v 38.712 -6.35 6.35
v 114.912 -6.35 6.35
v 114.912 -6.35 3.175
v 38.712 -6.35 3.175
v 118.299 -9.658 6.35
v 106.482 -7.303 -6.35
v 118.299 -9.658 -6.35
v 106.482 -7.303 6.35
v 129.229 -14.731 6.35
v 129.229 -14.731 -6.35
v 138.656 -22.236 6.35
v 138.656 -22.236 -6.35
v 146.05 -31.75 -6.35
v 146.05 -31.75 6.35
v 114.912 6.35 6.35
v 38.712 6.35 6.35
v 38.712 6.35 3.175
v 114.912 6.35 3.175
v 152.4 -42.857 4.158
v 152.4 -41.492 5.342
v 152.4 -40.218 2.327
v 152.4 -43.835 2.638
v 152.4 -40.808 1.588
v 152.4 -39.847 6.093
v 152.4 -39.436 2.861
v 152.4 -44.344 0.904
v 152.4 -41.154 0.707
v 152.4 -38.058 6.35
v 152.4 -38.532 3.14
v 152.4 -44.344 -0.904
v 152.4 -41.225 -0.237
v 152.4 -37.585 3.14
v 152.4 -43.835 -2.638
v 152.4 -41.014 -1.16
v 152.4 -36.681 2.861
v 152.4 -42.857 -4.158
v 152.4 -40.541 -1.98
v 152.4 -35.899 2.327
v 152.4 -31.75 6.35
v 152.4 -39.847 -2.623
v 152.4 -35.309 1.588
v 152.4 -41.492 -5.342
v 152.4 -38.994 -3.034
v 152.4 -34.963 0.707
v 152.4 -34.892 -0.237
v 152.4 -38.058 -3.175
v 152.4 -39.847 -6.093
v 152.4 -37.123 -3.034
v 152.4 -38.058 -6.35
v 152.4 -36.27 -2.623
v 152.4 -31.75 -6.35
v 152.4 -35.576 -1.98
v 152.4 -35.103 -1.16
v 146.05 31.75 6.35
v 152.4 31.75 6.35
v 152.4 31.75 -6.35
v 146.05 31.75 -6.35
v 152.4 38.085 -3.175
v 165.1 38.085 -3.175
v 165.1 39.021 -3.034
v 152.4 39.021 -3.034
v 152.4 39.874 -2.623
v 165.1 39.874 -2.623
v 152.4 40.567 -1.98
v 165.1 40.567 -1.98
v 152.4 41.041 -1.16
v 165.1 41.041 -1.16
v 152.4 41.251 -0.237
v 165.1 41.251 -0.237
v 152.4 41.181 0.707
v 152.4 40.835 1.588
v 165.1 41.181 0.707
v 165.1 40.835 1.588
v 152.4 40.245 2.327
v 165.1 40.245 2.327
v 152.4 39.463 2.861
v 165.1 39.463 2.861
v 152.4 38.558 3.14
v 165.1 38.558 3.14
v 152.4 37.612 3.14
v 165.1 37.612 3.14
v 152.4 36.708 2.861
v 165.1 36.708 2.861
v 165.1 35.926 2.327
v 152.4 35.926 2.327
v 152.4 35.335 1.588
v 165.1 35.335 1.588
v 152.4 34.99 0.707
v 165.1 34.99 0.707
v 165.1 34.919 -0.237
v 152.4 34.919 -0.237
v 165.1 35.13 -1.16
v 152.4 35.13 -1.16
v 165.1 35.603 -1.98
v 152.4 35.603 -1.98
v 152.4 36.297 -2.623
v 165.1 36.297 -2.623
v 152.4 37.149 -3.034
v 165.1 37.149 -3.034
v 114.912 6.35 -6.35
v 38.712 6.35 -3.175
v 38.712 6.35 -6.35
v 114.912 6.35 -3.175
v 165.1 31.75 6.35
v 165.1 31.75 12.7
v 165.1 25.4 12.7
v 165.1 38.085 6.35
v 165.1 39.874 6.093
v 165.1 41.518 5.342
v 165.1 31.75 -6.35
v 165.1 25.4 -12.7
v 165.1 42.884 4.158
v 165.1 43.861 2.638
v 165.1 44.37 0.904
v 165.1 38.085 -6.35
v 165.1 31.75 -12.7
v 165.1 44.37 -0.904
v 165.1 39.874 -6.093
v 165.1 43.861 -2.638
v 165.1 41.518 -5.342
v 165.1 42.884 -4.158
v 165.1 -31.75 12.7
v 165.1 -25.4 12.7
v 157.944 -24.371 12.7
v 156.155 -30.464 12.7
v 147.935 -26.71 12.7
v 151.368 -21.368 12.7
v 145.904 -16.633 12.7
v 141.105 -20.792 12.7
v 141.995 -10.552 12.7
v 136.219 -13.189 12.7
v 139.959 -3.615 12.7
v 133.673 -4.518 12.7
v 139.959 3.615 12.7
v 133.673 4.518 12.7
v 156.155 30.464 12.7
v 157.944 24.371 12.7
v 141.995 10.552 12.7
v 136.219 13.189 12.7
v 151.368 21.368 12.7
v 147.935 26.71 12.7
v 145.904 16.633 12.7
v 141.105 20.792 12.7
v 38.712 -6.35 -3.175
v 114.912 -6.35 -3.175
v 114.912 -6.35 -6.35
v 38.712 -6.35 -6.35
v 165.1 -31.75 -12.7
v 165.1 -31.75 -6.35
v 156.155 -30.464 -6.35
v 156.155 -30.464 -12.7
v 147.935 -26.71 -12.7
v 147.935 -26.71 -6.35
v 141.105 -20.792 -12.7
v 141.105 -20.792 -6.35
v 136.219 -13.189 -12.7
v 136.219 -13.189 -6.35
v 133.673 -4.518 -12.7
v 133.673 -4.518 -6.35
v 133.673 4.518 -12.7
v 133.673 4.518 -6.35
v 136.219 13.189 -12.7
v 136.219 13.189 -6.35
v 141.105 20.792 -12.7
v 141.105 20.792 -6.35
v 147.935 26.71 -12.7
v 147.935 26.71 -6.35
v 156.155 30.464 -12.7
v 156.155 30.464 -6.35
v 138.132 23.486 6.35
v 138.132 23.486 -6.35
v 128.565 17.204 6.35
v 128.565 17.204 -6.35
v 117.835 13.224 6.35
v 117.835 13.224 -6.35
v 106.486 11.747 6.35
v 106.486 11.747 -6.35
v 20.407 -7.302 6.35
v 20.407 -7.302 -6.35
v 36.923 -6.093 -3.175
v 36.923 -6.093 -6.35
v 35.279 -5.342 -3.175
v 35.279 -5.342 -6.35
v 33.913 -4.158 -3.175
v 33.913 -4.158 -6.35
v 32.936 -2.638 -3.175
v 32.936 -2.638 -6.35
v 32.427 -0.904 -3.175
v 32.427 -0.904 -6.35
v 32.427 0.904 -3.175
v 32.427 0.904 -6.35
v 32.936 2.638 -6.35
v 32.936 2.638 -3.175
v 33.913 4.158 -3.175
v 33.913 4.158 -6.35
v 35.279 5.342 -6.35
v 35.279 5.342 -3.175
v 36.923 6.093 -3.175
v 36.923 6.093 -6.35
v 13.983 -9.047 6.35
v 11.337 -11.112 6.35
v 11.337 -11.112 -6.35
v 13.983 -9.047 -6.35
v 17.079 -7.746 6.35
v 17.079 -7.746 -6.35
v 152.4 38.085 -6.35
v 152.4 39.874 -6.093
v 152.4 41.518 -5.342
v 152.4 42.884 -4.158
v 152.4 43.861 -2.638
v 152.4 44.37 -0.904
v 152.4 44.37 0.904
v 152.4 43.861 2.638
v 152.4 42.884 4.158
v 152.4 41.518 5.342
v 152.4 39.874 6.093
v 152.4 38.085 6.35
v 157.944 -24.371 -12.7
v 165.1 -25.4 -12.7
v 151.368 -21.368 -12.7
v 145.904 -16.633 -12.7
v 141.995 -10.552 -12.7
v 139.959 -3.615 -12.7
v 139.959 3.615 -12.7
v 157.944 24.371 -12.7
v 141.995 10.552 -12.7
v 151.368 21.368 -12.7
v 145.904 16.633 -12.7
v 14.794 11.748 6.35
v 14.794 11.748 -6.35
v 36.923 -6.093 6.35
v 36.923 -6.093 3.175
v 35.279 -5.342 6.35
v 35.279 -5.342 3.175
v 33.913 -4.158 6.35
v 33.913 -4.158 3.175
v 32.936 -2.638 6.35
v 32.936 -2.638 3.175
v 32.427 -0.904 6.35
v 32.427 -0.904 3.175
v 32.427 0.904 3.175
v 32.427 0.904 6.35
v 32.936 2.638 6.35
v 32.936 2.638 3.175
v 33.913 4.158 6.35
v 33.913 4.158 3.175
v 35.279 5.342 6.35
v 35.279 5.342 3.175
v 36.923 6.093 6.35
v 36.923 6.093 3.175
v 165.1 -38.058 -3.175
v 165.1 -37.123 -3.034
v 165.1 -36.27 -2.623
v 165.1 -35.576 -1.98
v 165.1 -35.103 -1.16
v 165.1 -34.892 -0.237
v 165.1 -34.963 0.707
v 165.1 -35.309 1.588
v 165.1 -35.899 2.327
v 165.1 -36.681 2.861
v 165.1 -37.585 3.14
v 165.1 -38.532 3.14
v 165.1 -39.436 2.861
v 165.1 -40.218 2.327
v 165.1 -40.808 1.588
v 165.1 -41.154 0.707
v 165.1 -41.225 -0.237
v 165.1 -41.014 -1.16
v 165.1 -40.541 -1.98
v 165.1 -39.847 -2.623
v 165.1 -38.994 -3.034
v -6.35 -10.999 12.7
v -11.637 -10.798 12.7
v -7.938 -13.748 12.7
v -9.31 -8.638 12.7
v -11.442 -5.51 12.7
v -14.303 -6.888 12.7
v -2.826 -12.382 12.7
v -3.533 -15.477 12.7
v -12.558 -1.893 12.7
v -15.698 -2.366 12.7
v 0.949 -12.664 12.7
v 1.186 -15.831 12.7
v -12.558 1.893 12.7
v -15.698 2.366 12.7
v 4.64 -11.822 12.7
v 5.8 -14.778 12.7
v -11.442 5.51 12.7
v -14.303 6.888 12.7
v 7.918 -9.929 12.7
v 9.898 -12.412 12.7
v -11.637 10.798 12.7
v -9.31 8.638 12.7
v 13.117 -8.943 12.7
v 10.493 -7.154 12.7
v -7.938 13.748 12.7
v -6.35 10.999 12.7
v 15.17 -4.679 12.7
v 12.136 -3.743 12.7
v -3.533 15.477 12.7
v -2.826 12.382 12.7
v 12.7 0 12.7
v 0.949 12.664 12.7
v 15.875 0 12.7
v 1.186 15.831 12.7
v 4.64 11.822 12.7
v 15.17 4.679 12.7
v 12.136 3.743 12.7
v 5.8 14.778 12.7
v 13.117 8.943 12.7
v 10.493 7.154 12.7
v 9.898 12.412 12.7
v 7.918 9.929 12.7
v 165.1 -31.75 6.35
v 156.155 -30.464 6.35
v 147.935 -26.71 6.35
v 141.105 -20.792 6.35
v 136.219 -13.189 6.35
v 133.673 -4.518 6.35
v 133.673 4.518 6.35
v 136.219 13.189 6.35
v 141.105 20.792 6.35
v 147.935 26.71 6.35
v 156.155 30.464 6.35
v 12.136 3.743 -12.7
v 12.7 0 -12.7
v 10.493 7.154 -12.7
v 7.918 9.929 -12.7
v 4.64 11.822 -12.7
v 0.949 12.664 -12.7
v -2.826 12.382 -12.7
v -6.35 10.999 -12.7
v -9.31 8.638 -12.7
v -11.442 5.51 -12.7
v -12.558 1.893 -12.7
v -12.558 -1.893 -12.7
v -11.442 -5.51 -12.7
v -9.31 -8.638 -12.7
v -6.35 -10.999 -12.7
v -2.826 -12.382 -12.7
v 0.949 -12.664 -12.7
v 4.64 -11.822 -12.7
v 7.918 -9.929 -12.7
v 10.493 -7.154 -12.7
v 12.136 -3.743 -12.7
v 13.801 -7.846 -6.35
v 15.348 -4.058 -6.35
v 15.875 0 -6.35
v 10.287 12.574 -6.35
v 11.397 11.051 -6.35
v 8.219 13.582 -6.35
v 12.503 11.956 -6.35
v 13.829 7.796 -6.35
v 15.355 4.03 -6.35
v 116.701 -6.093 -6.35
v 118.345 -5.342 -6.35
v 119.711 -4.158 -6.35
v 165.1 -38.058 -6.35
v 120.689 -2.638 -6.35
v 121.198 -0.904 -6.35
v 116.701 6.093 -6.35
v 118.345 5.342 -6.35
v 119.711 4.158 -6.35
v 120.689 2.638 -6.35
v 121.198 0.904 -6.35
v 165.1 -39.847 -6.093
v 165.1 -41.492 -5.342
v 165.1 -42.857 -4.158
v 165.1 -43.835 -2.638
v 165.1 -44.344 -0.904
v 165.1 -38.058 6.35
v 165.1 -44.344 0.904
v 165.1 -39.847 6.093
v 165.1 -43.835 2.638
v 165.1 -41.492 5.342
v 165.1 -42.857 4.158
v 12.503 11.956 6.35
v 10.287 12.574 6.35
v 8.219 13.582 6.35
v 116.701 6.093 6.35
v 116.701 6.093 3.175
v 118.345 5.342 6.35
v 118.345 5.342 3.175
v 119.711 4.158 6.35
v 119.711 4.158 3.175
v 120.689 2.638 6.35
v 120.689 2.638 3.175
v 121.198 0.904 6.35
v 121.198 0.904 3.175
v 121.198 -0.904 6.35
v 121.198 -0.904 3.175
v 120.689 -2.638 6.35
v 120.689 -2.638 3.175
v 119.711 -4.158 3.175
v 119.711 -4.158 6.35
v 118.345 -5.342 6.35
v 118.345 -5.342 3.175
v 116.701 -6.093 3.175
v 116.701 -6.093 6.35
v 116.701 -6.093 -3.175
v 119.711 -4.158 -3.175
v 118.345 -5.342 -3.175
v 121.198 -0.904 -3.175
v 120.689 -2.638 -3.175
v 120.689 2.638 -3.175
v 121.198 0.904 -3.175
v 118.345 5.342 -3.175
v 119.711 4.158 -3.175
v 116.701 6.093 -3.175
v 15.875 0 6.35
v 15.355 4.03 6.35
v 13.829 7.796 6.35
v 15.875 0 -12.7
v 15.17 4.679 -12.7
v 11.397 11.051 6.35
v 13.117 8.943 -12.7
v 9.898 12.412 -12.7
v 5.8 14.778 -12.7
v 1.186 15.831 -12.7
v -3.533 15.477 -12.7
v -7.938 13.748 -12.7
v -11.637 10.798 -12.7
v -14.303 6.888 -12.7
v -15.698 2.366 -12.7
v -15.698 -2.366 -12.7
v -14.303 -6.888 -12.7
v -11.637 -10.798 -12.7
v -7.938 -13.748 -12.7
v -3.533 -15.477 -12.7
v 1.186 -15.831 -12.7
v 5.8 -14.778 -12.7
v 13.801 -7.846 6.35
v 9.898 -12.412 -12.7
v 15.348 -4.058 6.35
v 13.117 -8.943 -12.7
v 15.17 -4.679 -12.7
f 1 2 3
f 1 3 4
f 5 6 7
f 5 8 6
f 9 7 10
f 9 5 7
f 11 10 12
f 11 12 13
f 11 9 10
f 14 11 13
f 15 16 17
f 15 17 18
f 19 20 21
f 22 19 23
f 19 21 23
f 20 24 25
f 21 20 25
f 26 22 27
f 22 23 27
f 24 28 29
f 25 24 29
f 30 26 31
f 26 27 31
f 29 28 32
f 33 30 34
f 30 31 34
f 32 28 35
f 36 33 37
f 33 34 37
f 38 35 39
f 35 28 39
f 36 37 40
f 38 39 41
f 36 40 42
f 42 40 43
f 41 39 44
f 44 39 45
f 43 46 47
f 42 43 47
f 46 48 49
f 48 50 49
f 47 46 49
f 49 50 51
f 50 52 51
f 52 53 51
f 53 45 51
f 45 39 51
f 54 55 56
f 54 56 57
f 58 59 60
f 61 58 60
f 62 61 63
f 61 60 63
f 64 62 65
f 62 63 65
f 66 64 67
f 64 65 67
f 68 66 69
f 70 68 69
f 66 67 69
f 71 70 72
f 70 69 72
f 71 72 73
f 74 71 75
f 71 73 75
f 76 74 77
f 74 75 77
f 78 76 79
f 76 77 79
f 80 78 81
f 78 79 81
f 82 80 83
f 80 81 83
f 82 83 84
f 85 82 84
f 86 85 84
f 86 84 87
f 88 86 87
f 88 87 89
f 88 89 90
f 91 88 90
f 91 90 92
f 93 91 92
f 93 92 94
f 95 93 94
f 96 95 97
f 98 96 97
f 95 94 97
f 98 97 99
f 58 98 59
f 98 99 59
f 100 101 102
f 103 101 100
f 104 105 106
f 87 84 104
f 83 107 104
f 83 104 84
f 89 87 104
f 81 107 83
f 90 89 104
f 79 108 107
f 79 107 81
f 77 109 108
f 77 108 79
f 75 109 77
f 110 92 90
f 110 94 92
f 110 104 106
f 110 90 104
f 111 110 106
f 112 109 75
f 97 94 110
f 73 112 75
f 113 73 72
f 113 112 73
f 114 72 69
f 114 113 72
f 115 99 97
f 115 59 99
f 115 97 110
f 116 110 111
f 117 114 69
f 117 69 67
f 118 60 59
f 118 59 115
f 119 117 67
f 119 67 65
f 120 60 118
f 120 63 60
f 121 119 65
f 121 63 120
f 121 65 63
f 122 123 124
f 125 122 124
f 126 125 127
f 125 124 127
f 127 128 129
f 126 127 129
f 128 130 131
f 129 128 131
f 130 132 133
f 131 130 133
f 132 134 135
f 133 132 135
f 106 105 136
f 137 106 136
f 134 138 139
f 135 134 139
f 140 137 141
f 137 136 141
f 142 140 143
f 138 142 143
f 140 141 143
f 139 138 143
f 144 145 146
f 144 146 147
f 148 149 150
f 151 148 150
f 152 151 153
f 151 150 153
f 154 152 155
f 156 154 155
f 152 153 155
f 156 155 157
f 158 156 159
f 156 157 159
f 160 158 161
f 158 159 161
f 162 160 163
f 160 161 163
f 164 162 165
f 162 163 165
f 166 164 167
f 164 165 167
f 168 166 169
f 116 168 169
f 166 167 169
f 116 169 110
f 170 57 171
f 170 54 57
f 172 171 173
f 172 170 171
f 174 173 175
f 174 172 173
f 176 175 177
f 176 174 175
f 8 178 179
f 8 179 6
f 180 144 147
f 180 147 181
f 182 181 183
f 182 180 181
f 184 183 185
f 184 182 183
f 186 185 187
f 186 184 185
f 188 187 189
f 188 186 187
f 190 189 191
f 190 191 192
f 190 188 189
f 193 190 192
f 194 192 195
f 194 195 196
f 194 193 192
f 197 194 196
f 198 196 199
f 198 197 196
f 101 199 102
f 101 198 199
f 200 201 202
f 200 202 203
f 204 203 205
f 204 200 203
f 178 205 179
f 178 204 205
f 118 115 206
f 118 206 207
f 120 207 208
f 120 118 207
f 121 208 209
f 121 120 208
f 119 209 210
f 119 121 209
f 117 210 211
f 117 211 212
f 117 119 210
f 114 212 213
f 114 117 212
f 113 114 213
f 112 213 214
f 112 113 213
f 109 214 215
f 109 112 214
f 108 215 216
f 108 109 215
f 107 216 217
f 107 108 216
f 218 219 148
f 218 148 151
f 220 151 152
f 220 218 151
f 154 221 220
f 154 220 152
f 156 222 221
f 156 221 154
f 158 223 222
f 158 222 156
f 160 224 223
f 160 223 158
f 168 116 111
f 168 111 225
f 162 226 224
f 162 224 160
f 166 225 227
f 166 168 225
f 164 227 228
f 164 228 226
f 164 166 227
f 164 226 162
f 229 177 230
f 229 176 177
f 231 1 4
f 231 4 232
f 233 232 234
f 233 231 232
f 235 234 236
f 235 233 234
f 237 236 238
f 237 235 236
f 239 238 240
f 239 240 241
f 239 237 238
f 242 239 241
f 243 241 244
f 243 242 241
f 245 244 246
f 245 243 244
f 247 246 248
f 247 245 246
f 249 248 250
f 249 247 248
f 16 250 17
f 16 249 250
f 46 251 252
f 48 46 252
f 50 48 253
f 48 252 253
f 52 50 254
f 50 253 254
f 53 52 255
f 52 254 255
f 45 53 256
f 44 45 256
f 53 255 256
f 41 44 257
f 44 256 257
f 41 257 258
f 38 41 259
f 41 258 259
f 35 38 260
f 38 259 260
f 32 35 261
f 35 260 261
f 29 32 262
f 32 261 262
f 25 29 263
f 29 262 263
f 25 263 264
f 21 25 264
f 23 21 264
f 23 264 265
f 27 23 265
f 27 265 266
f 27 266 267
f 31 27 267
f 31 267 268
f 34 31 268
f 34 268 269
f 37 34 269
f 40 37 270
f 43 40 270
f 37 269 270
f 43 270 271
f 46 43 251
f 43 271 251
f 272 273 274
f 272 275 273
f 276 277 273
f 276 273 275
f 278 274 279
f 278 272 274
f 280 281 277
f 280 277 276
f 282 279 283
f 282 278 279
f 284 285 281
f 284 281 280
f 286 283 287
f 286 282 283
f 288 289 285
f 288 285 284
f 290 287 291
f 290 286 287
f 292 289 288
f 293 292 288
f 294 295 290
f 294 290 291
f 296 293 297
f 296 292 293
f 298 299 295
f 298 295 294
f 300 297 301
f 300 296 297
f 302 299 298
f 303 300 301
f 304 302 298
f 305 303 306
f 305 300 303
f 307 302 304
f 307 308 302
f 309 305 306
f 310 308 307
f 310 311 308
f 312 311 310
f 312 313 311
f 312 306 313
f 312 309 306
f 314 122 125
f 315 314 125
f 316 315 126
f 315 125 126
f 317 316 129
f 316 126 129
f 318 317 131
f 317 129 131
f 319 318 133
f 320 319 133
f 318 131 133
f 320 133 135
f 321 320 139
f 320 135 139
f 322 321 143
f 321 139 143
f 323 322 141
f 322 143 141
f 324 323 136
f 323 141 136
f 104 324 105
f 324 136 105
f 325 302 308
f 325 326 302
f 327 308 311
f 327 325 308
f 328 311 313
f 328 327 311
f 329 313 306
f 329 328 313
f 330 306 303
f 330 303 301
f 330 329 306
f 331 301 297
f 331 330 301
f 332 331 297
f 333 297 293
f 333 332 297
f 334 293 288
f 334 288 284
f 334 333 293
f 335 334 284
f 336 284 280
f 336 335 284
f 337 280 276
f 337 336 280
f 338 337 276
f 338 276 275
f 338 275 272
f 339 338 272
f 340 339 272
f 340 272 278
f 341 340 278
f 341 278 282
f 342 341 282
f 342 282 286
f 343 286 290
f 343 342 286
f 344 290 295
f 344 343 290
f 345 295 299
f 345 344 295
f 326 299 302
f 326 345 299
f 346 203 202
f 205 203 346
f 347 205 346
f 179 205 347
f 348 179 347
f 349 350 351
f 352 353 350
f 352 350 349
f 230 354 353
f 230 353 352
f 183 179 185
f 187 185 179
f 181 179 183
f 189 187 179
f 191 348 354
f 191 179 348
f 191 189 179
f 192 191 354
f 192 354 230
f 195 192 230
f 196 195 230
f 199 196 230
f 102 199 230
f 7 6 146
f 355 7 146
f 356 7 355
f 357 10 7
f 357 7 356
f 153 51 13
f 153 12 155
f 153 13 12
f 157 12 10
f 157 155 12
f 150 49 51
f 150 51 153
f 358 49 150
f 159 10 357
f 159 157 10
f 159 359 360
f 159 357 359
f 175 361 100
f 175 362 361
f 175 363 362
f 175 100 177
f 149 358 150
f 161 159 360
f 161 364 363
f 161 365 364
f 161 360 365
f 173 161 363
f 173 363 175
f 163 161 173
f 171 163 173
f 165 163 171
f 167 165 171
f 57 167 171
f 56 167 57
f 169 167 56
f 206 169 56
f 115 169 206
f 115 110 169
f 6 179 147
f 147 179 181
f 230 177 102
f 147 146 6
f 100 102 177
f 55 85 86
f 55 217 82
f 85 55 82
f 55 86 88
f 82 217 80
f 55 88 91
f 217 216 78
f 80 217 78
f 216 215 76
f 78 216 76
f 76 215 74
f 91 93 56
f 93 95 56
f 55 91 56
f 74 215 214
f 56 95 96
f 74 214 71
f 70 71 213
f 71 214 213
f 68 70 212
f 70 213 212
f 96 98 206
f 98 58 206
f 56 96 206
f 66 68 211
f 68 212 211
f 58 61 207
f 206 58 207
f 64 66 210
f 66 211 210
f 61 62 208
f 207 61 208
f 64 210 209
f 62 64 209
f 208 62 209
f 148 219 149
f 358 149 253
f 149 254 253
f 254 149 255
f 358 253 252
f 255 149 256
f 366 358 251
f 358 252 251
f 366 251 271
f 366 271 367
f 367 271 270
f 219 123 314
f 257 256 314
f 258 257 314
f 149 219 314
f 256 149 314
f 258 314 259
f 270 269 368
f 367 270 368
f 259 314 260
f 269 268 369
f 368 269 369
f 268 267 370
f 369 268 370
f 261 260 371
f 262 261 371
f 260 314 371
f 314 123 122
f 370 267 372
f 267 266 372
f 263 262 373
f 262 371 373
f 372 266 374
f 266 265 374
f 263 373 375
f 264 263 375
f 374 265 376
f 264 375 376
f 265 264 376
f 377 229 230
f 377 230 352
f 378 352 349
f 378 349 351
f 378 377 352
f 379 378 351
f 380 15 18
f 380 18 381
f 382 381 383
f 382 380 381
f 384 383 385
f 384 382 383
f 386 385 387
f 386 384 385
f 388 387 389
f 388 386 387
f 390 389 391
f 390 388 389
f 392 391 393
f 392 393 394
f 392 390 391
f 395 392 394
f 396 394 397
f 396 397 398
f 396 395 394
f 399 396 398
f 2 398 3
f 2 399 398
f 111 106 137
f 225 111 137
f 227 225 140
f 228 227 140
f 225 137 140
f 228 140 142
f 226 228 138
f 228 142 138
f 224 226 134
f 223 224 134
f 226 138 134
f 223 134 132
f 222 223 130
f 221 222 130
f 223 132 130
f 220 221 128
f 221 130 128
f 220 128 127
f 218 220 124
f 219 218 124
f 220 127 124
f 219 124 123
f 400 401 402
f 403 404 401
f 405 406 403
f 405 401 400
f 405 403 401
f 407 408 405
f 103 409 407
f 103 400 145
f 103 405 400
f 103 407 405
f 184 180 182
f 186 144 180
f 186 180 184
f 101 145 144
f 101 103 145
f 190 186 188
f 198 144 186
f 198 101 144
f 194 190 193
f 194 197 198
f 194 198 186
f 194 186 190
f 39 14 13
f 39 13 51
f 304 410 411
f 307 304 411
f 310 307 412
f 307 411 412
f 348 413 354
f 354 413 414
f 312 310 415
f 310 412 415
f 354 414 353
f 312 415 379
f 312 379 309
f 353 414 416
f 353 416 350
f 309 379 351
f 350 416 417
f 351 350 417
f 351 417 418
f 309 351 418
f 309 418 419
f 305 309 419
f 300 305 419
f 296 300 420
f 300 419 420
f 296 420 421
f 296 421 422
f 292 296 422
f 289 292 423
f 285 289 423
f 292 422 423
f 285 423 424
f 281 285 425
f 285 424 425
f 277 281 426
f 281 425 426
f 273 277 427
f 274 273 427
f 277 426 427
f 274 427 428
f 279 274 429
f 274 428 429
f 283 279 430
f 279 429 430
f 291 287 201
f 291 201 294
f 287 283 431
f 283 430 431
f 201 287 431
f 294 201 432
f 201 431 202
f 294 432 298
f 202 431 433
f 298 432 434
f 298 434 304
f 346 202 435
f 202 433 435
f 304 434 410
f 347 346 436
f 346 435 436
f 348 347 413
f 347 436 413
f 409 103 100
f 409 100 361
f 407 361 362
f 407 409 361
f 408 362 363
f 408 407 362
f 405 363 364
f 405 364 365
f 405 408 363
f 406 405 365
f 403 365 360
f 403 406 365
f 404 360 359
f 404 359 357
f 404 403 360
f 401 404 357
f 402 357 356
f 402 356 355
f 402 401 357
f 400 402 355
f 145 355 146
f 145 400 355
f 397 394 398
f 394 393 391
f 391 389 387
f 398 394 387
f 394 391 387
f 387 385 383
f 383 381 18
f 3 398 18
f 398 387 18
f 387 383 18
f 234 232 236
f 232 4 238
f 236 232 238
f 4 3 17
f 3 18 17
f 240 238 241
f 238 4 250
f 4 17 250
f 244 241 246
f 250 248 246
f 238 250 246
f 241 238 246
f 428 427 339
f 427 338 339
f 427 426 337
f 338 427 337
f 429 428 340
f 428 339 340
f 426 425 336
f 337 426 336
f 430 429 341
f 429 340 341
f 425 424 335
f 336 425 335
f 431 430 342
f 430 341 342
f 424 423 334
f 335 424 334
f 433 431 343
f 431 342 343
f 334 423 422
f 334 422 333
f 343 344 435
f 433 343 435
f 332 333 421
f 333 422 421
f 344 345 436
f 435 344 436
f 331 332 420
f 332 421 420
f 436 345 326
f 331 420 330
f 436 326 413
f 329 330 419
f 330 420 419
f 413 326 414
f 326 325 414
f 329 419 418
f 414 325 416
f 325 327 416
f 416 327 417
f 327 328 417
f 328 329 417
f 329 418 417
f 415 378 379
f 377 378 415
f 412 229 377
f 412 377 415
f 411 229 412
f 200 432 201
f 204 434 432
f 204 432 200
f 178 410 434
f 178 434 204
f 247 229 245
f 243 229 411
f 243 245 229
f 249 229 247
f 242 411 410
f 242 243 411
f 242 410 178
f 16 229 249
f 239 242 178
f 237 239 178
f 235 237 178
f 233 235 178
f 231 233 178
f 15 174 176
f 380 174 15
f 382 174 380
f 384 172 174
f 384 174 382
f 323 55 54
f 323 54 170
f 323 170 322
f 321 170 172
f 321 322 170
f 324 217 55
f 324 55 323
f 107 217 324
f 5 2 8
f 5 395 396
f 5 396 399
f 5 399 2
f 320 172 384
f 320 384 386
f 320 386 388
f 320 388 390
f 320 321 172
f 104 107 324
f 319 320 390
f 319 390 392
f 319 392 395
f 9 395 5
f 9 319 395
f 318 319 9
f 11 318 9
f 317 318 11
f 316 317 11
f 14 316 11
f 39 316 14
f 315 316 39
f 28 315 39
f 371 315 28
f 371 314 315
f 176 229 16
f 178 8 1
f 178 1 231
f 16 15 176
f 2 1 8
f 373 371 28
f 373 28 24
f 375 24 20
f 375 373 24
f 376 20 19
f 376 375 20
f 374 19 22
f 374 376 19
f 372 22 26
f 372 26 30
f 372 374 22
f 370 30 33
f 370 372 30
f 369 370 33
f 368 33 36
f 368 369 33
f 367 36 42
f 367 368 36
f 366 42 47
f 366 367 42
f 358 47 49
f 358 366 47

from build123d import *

# Parameters (mm, degrees)
BOSS_EXTRUDE2_DEPTH = 6.35
SKETCH2_8_R         = 15.875
SKETCH2_8_R_2       = 12.7
BOSS_EXTRUDE3_DEPTH = 12.7
BOSS_EXTRUDE4_DEPTH = 3.175
SKETCH3_R           = 3.175
BOSS_EXTRUDE6_DEPTH = 12.7


with BuildPart() as part:
    # Sketch2 → Boss-Extrude2 (new, symmetric)
    with BuildSketch(Plane.XY):
        with BuildLine():
            Line((106.485681071, 11.7475), (14.793592152, 11.7475))
            ThreePointArc((14.793592152, 11.7475), (11.380569705, 12.214704826), (8.218662306, 13.581944444))
            ThreePointArc((8.218662306, 13.581944444), (13.829079671, 7.79565138), (15.875, 0))
            ThreePointArc((15.875, 0), (14.696781618, -6.001686018), (11.33701763, -11.1125))
            ThreePointArc((11.33701763, -11.1125), (15.487942885, -8.293678539), (20.406631735, -7.3025))
            Line((20.406631735, -7.3025), (106.48193654, -7.3025))
            ThreePointArc((106.48193654, -7.3025), (129.228859651, -14.730836392), (146.05, -31.75))
            Line((146.05, -31.75), (165.1, -31.75))
            ThreePointArc((165.1, -31.75), (133.35, 0), (165.1, 31.75))
            Line((165.1, 31.75), (146.05, 31.75))
            ThreePointArc((146.05, 31.75), (128.565457442, 17.204135674), (106.485681071, 11.7475))
        make_face()
        with BuildLine():
            ThreePointArc((38.712408675, -6.35), (32.362408675, 0), (38.712408675, 6.35))
            Line((38.712408675, 6.35), (114.912408675, 6.35))
            ThreePointArc((114.912408675, 6.35), (121.262408675, 0), (114.912408675, -6.35))
            Line((114.912408675, -6.35), (38.712408675, -6.35))
        make_face(mode=Mode.SUBTRACT)
    extrude(amount=BOSS_EXTRUDE2_DEPTH, both=True)

    # Sketch2<8> → Boss-Extrude3 (add, symmetric)
    # profile 1 of 2: a face of its own
    with BuildSketch(Plane.XY):
        Circle(SKETCH2_8_R)
        Circle(SKETCH2_8_R_2, mode=Mode.SUBTRACT)
    # profile 2 of 2: a face of its own
    with BuildSketch(Plane.XY):
        with BuildLine():
            Line((165.1, 25.4), (165.1, 31.75))
            ThreePointArc((165.1, 31.75), (133.35, 0), (165.1, -31.75))
            Line((165.1, -31.75), (165.1, -25.4))
            ThreePointArc((165.1, -25.4), (139.7, 0), (165.1, 25.4))
        make_face()
    extrude(amount=BOSS_EXTRUDE3_DEPTH, both=True)

    # Sketch2<9> → Boss-Extrude4 (add, symmetric)
    with BuildSketch(Plane.XY):
        with BuildLine():
            Line((114.912408675, 6.35), (38.712408675, 6.35))
            ThreePointArc((38.712408675, 6.35), (32.362408675, 0), (38.712408675, -6.35))
            Line((38.712408675, -6.35), (114.912408675, -6.35))
            ThreePointArc((114.912408675, -6.35), (121.262408675, 0), (114.912408675, 6.35))
        make_face()
    extrude(amount=BOSS_EXTRUDE4_DEPTH, both=True)

    # Sketch3 → Boss-Extrude6 (add)
    # profile 1 of 2: a face of its own
    with BuildSketch(Plane(origin=(165.1, 0, 0), x_dir=(0, 0, -1), z_dir=(1, 0, 0))):
        with BuildLine():
            Line((-6.35, 38.085125464), (-6.35, 31.75))
            Line((-6.35, 31.75), (6.35, 31.75))
            Line((6.35, 31.75), (6.35, 38.085125464))
            ThreePointArc((6.35, 38.085125464), (0, 44.435125464), (-6.35, 38.085125464))
        make_face()
        with Locations((0, 38.085125464)):
            Circle(SKETCH3_R, mode=Mode.SUBTRACT)
    # profile 2 of 2: a face of its own
    with BuildSketch(Plane(origin=(165.1, 0, 0), x_dir=(0, 0, -1), z_dir=(1, 0, 0))):
        with BuildLine():
            Line((6.35, -31.75), (-6.35, -31.75))
            Line((-6.35, -31.75), (-6.35, -38.058434683))
            ThreePointArc((-6.35, -38.058434683), (0, -44.408434683), (6.35, -38.058434683))
            Line((6.35, -38.058434683), (6.35, -31.75))
        make_face()
        with Locations((0, -38.058434683)):
            Circle(SKETCH3_R, mode=Mode.SUBTRACT)
    extrude(amount=-BOSS_EXTRUDE6_DEPTH)


solid = part.part
